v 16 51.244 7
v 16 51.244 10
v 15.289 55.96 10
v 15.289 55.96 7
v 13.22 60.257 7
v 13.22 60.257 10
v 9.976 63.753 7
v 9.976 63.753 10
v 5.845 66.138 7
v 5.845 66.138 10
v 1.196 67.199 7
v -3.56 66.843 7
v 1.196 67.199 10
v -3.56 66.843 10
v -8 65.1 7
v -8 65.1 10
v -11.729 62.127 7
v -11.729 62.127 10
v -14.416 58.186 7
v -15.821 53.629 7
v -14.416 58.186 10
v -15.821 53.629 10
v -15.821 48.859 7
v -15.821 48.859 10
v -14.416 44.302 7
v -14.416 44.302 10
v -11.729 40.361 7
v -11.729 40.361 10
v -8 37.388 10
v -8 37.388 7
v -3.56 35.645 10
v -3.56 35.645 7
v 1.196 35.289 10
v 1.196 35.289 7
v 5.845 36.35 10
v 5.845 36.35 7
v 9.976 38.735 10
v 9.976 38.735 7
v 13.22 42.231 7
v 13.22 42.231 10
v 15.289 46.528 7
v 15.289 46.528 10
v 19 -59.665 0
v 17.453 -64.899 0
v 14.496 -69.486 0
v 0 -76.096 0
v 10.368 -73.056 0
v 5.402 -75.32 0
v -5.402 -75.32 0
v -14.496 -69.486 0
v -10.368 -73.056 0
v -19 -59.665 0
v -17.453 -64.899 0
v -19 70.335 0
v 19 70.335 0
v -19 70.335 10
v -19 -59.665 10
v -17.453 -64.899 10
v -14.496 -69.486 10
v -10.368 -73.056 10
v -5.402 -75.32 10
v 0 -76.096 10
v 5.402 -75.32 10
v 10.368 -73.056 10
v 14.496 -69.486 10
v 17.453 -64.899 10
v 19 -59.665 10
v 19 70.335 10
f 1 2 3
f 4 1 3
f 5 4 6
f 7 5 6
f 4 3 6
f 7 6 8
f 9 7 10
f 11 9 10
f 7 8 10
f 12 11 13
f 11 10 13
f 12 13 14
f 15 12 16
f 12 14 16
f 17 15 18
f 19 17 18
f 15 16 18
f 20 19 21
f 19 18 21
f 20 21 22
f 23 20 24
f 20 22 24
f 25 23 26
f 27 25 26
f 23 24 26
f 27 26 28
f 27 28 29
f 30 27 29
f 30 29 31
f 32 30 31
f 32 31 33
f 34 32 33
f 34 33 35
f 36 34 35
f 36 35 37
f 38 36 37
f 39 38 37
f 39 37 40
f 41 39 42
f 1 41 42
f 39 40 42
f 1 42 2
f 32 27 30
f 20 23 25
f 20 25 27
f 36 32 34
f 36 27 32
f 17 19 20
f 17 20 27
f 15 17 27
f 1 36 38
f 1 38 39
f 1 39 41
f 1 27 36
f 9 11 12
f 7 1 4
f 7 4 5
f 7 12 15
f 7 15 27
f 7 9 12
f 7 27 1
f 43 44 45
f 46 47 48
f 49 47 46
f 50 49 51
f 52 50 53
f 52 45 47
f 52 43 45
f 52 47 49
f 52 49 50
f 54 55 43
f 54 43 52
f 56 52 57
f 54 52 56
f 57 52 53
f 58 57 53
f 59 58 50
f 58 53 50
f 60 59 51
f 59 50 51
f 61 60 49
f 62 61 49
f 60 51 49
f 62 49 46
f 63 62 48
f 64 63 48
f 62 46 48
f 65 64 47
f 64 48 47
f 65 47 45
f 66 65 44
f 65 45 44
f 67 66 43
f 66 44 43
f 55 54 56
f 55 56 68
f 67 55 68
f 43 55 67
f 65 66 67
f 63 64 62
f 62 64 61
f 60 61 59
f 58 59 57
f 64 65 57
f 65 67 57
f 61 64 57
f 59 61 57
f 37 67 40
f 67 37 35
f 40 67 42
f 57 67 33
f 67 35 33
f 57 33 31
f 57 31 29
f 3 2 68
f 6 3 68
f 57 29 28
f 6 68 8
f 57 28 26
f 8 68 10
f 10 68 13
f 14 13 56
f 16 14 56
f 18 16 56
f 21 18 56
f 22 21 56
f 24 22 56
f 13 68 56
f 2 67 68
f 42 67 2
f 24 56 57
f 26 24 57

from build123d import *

# Parameters (mm, degrees)
PAD_DEPTH    = 10
SKETCH001_R  = 16
POCKET_DEPTH = 3


with BuildPart() as part:
    # Sketch → Pad (new body)
    with BuildSketch(Plane.XY):
        with BuildLine():
            Line((-19, 70.33521), (19, 70.33521))
            Line((19, 70.33521), (19, -59.66479))
            ThreePointArc((-19, -59.66479), (0, -76.095918), (19, -59.66479))
            Line((-19, -59.66479), (-19, 70.33521))
        make_face()
    extrude(amount=PAD_DEPTH)

    # Sketch001 → Pocket (cut)
    with BuildSketch(Plane.XY.offset(10)):
        with Locations((0, 51.243999)):
            Circle(SKETCH001_R)
    extrude(amount=-POCKET_DEPTH, mode=Mode.SUBTRACT)


solid = part.part
